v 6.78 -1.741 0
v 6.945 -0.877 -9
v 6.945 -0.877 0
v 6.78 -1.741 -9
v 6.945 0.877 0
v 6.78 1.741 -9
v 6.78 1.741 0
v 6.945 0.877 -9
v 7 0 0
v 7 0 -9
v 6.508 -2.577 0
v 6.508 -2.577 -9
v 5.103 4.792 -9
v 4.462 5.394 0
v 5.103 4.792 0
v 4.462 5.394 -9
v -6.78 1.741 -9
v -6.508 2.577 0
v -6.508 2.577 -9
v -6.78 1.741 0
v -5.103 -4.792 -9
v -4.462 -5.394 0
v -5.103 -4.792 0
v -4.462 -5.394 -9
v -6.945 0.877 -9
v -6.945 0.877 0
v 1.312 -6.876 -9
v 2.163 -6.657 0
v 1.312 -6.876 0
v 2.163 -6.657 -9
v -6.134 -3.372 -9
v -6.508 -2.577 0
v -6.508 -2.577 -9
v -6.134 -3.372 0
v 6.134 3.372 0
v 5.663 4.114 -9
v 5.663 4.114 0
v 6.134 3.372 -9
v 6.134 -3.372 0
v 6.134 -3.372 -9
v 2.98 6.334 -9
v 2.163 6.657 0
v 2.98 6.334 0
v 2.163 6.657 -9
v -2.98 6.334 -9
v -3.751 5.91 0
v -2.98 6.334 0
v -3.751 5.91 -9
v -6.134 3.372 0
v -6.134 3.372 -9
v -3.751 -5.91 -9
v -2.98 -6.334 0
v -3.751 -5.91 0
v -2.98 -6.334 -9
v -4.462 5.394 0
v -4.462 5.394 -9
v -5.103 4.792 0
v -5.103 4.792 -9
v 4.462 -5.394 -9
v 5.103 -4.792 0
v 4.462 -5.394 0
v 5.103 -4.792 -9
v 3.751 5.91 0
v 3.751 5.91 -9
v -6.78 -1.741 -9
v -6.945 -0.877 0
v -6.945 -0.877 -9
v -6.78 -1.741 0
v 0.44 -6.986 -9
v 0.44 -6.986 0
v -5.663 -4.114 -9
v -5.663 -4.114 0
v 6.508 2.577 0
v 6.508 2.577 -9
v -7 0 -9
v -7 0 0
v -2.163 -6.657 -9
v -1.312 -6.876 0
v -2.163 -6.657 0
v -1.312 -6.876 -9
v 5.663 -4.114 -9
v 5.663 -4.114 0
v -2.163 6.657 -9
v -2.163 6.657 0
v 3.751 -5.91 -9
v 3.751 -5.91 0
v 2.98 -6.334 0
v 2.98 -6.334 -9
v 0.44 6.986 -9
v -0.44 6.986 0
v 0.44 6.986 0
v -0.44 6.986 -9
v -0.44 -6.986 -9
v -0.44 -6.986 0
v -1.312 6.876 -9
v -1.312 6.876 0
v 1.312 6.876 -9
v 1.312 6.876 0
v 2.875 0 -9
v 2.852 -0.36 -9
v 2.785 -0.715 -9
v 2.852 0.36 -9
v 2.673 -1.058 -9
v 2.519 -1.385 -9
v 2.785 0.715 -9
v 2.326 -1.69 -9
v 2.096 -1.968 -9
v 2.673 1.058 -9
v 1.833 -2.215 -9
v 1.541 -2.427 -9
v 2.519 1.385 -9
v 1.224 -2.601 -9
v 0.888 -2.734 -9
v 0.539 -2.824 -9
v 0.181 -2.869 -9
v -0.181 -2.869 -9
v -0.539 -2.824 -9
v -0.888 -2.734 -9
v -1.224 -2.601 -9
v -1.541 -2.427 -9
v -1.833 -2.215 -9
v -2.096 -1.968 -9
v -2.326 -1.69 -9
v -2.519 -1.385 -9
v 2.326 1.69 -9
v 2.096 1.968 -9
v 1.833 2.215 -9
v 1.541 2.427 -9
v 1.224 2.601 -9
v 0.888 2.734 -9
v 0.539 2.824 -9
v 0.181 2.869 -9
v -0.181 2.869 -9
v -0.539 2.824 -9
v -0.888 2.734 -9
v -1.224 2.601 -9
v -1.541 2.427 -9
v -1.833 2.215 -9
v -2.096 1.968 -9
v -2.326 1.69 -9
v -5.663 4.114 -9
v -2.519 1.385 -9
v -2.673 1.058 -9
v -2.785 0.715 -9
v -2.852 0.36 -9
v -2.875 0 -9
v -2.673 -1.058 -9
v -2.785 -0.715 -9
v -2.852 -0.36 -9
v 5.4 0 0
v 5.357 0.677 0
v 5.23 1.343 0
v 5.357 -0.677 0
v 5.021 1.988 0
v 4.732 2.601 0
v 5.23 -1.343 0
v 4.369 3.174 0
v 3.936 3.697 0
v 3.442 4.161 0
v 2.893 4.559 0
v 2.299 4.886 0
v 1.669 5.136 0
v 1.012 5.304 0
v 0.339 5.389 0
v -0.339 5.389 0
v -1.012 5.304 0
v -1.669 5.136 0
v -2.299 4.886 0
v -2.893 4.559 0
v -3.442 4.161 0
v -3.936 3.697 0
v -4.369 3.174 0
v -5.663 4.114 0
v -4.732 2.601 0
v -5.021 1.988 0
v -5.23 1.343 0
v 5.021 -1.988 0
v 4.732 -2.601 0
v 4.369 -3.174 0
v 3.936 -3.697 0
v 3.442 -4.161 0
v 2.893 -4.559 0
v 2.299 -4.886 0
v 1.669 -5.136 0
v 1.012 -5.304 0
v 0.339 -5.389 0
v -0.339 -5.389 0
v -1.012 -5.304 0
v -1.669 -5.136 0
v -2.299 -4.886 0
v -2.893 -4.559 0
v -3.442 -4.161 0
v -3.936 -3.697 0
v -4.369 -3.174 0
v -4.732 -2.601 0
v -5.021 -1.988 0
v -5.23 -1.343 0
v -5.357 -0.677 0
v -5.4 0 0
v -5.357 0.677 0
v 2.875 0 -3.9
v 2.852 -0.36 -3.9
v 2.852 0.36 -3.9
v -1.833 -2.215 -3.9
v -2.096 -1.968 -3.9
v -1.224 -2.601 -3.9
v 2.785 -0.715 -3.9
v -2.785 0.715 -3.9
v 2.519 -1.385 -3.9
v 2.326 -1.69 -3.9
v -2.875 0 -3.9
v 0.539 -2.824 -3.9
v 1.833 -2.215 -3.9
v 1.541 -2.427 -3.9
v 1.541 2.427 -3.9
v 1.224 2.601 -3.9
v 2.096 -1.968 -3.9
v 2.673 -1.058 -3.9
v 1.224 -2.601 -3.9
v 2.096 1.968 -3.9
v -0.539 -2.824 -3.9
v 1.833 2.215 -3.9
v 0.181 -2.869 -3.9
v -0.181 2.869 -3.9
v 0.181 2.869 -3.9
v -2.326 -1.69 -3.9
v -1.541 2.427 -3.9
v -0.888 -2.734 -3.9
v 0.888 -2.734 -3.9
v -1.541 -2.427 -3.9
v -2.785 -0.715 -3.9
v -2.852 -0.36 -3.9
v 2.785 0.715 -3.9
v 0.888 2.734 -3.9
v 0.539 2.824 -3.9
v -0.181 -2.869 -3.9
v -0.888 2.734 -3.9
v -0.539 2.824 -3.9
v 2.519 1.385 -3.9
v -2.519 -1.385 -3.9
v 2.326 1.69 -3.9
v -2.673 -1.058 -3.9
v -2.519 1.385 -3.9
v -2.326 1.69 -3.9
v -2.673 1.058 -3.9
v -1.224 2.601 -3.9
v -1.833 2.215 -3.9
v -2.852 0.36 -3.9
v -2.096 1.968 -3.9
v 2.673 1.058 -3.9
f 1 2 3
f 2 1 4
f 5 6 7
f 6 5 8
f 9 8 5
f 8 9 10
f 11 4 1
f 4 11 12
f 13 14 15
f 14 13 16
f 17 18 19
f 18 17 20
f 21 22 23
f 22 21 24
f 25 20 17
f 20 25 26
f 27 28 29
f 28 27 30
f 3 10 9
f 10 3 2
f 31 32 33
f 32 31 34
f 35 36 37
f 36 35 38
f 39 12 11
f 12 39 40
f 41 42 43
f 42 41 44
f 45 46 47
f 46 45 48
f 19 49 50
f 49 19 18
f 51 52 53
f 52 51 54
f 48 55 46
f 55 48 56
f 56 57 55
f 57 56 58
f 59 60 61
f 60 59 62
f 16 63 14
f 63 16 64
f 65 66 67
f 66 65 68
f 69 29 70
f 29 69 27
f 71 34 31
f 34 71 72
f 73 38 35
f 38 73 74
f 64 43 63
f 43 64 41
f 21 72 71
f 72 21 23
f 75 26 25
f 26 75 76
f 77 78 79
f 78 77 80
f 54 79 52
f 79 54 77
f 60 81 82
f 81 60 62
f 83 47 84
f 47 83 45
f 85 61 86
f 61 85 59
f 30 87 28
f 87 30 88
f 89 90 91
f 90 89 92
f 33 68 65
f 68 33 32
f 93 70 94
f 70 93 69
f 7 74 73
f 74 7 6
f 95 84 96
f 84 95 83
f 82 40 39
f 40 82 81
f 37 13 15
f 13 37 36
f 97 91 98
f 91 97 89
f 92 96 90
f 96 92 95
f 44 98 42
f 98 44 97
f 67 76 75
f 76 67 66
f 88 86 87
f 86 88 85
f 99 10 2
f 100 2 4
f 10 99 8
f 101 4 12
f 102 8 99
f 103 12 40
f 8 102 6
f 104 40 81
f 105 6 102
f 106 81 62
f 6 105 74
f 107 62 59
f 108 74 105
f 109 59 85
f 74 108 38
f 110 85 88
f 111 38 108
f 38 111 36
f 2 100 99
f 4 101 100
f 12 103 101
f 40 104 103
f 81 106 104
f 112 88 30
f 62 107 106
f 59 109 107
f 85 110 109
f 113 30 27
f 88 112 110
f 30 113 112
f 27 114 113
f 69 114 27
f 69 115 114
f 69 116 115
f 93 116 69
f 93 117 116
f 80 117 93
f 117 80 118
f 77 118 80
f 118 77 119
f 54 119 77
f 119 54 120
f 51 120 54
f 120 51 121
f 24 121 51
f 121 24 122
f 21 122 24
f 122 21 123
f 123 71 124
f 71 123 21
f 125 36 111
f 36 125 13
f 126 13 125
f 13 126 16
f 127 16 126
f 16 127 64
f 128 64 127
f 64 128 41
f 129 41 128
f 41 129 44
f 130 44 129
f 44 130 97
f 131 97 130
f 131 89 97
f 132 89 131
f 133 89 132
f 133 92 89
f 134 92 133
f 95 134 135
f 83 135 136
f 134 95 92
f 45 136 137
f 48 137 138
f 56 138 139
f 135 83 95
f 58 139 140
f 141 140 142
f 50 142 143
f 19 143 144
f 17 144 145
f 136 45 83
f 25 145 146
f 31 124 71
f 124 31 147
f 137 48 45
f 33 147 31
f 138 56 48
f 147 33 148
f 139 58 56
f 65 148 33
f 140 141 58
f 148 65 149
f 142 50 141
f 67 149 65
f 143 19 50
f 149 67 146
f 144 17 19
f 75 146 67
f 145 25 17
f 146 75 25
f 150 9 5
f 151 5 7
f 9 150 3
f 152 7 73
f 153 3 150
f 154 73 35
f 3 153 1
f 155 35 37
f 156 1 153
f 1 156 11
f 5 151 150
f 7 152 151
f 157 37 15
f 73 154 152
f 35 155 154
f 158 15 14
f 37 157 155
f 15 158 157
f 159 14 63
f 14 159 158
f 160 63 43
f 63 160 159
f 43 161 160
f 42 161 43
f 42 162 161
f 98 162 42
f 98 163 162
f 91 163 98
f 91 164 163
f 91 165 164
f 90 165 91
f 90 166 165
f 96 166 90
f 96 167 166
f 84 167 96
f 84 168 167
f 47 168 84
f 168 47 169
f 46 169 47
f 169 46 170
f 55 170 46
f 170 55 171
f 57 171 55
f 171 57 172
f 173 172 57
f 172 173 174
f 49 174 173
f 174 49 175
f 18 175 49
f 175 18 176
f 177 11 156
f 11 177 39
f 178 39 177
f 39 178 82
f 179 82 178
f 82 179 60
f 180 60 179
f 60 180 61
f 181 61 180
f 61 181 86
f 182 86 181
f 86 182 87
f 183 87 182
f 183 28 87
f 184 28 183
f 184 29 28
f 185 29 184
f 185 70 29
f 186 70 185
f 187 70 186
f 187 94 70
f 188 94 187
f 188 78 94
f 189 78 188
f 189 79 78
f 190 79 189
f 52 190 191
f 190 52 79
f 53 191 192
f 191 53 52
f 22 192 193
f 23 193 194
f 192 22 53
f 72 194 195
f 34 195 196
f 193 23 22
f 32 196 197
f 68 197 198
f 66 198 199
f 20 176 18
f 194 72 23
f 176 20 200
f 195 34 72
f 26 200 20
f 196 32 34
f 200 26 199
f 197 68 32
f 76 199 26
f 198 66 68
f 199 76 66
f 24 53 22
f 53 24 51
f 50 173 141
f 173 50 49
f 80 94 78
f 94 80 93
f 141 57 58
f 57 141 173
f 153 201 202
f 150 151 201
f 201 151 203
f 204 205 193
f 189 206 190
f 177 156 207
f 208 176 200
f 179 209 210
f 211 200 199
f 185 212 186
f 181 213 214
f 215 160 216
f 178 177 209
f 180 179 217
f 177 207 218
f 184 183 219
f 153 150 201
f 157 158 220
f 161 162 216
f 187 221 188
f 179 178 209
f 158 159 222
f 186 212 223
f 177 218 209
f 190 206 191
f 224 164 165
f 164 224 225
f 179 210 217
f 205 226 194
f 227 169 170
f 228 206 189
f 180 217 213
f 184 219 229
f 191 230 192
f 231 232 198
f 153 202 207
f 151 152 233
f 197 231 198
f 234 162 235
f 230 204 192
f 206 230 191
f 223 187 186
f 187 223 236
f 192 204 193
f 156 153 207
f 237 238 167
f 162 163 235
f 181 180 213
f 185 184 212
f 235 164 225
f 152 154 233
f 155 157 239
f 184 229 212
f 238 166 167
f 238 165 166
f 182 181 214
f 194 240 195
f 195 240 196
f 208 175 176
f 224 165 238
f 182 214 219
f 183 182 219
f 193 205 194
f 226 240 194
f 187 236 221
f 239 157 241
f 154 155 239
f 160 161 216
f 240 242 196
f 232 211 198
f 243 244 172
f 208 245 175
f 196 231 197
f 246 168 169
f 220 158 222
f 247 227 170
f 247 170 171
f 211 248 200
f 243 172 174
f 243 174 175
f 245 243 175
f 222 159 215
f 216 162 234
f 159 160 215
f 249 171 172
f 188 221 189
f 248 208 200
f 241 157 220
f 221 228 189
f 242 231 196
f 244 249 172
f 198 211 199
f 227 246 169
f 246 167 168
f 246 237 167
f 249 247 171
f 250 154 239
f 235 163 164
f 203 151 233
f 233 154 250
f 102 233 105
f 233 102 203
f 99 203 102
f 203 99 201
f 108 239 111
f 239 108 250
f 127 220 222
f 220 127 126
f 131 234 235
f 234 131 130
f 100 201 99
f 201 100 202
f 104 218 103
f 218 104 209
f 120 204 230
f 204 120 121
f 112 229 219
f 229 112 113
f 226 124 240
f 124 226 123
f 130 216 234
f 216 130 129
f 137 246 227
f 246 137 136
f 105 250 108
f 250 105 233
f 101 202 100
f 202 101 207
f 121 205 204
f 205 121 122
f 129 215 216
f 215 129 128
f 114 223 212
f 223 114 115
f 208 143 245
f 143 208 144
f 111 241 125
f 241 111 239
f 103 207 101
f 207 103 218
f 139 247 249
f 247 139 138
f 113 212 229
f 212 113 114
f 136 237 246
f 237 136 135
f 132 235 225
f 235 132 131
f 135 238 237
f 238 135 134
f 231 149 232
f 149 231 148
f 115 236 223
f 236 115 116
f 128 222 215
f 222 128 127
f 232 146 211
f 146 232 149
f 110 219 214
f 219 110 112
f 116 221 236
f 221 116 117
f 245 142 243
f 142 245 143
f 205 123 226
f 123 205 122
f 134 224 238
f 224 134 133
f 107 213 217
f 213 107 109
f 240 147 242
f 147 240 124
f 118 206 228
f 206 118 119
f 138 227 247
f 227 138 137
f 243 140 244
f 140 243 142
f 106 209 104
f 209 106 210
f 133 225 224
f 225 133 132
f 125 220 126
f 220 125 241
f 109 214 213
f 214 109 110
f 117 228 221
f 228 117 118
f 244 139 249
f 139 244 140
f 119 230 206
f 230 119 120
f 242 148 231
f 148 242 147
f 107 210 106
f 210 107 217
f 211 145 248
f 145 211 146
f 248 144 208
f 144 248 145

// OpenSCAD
$fn = 50;


difference() {
	union() {
		translate(v = [0, 0, -9.0000000000]) {
			cylinder(h = 9, r = 7.0000000000);
		}
		translate(v = [0, 0, -9.0000000000]) {
			cylinder(h = 9, r = 2.8750000000);
		}
	}
	union() {
		translate(v = [0, 0, 0]) {
			rotate(a = [0, 0, 0]) {
				difference() {
					union() {
						translate(v = [0, 0, -9.0000000000]) {
							cylinder(h = 9, r = 2.6000000000);
						}
						translate(v = [0, 0, -3.9000000000]) {
							cylinder(h = 3.9000000000, r1 = 2.8750000000, r2 = 5.4000000000);
						}
						translate(v = [0, 0, -9.0000000000]) {
							cylinder(h = 9, r = 2.8750000000);
						}
						translate(v = [0, 0, -9.0000000000]) {
							cylinder(h = 9, r = 2.6000000000);
						}
					}
					union();
				}
			}
		}
	}
}
